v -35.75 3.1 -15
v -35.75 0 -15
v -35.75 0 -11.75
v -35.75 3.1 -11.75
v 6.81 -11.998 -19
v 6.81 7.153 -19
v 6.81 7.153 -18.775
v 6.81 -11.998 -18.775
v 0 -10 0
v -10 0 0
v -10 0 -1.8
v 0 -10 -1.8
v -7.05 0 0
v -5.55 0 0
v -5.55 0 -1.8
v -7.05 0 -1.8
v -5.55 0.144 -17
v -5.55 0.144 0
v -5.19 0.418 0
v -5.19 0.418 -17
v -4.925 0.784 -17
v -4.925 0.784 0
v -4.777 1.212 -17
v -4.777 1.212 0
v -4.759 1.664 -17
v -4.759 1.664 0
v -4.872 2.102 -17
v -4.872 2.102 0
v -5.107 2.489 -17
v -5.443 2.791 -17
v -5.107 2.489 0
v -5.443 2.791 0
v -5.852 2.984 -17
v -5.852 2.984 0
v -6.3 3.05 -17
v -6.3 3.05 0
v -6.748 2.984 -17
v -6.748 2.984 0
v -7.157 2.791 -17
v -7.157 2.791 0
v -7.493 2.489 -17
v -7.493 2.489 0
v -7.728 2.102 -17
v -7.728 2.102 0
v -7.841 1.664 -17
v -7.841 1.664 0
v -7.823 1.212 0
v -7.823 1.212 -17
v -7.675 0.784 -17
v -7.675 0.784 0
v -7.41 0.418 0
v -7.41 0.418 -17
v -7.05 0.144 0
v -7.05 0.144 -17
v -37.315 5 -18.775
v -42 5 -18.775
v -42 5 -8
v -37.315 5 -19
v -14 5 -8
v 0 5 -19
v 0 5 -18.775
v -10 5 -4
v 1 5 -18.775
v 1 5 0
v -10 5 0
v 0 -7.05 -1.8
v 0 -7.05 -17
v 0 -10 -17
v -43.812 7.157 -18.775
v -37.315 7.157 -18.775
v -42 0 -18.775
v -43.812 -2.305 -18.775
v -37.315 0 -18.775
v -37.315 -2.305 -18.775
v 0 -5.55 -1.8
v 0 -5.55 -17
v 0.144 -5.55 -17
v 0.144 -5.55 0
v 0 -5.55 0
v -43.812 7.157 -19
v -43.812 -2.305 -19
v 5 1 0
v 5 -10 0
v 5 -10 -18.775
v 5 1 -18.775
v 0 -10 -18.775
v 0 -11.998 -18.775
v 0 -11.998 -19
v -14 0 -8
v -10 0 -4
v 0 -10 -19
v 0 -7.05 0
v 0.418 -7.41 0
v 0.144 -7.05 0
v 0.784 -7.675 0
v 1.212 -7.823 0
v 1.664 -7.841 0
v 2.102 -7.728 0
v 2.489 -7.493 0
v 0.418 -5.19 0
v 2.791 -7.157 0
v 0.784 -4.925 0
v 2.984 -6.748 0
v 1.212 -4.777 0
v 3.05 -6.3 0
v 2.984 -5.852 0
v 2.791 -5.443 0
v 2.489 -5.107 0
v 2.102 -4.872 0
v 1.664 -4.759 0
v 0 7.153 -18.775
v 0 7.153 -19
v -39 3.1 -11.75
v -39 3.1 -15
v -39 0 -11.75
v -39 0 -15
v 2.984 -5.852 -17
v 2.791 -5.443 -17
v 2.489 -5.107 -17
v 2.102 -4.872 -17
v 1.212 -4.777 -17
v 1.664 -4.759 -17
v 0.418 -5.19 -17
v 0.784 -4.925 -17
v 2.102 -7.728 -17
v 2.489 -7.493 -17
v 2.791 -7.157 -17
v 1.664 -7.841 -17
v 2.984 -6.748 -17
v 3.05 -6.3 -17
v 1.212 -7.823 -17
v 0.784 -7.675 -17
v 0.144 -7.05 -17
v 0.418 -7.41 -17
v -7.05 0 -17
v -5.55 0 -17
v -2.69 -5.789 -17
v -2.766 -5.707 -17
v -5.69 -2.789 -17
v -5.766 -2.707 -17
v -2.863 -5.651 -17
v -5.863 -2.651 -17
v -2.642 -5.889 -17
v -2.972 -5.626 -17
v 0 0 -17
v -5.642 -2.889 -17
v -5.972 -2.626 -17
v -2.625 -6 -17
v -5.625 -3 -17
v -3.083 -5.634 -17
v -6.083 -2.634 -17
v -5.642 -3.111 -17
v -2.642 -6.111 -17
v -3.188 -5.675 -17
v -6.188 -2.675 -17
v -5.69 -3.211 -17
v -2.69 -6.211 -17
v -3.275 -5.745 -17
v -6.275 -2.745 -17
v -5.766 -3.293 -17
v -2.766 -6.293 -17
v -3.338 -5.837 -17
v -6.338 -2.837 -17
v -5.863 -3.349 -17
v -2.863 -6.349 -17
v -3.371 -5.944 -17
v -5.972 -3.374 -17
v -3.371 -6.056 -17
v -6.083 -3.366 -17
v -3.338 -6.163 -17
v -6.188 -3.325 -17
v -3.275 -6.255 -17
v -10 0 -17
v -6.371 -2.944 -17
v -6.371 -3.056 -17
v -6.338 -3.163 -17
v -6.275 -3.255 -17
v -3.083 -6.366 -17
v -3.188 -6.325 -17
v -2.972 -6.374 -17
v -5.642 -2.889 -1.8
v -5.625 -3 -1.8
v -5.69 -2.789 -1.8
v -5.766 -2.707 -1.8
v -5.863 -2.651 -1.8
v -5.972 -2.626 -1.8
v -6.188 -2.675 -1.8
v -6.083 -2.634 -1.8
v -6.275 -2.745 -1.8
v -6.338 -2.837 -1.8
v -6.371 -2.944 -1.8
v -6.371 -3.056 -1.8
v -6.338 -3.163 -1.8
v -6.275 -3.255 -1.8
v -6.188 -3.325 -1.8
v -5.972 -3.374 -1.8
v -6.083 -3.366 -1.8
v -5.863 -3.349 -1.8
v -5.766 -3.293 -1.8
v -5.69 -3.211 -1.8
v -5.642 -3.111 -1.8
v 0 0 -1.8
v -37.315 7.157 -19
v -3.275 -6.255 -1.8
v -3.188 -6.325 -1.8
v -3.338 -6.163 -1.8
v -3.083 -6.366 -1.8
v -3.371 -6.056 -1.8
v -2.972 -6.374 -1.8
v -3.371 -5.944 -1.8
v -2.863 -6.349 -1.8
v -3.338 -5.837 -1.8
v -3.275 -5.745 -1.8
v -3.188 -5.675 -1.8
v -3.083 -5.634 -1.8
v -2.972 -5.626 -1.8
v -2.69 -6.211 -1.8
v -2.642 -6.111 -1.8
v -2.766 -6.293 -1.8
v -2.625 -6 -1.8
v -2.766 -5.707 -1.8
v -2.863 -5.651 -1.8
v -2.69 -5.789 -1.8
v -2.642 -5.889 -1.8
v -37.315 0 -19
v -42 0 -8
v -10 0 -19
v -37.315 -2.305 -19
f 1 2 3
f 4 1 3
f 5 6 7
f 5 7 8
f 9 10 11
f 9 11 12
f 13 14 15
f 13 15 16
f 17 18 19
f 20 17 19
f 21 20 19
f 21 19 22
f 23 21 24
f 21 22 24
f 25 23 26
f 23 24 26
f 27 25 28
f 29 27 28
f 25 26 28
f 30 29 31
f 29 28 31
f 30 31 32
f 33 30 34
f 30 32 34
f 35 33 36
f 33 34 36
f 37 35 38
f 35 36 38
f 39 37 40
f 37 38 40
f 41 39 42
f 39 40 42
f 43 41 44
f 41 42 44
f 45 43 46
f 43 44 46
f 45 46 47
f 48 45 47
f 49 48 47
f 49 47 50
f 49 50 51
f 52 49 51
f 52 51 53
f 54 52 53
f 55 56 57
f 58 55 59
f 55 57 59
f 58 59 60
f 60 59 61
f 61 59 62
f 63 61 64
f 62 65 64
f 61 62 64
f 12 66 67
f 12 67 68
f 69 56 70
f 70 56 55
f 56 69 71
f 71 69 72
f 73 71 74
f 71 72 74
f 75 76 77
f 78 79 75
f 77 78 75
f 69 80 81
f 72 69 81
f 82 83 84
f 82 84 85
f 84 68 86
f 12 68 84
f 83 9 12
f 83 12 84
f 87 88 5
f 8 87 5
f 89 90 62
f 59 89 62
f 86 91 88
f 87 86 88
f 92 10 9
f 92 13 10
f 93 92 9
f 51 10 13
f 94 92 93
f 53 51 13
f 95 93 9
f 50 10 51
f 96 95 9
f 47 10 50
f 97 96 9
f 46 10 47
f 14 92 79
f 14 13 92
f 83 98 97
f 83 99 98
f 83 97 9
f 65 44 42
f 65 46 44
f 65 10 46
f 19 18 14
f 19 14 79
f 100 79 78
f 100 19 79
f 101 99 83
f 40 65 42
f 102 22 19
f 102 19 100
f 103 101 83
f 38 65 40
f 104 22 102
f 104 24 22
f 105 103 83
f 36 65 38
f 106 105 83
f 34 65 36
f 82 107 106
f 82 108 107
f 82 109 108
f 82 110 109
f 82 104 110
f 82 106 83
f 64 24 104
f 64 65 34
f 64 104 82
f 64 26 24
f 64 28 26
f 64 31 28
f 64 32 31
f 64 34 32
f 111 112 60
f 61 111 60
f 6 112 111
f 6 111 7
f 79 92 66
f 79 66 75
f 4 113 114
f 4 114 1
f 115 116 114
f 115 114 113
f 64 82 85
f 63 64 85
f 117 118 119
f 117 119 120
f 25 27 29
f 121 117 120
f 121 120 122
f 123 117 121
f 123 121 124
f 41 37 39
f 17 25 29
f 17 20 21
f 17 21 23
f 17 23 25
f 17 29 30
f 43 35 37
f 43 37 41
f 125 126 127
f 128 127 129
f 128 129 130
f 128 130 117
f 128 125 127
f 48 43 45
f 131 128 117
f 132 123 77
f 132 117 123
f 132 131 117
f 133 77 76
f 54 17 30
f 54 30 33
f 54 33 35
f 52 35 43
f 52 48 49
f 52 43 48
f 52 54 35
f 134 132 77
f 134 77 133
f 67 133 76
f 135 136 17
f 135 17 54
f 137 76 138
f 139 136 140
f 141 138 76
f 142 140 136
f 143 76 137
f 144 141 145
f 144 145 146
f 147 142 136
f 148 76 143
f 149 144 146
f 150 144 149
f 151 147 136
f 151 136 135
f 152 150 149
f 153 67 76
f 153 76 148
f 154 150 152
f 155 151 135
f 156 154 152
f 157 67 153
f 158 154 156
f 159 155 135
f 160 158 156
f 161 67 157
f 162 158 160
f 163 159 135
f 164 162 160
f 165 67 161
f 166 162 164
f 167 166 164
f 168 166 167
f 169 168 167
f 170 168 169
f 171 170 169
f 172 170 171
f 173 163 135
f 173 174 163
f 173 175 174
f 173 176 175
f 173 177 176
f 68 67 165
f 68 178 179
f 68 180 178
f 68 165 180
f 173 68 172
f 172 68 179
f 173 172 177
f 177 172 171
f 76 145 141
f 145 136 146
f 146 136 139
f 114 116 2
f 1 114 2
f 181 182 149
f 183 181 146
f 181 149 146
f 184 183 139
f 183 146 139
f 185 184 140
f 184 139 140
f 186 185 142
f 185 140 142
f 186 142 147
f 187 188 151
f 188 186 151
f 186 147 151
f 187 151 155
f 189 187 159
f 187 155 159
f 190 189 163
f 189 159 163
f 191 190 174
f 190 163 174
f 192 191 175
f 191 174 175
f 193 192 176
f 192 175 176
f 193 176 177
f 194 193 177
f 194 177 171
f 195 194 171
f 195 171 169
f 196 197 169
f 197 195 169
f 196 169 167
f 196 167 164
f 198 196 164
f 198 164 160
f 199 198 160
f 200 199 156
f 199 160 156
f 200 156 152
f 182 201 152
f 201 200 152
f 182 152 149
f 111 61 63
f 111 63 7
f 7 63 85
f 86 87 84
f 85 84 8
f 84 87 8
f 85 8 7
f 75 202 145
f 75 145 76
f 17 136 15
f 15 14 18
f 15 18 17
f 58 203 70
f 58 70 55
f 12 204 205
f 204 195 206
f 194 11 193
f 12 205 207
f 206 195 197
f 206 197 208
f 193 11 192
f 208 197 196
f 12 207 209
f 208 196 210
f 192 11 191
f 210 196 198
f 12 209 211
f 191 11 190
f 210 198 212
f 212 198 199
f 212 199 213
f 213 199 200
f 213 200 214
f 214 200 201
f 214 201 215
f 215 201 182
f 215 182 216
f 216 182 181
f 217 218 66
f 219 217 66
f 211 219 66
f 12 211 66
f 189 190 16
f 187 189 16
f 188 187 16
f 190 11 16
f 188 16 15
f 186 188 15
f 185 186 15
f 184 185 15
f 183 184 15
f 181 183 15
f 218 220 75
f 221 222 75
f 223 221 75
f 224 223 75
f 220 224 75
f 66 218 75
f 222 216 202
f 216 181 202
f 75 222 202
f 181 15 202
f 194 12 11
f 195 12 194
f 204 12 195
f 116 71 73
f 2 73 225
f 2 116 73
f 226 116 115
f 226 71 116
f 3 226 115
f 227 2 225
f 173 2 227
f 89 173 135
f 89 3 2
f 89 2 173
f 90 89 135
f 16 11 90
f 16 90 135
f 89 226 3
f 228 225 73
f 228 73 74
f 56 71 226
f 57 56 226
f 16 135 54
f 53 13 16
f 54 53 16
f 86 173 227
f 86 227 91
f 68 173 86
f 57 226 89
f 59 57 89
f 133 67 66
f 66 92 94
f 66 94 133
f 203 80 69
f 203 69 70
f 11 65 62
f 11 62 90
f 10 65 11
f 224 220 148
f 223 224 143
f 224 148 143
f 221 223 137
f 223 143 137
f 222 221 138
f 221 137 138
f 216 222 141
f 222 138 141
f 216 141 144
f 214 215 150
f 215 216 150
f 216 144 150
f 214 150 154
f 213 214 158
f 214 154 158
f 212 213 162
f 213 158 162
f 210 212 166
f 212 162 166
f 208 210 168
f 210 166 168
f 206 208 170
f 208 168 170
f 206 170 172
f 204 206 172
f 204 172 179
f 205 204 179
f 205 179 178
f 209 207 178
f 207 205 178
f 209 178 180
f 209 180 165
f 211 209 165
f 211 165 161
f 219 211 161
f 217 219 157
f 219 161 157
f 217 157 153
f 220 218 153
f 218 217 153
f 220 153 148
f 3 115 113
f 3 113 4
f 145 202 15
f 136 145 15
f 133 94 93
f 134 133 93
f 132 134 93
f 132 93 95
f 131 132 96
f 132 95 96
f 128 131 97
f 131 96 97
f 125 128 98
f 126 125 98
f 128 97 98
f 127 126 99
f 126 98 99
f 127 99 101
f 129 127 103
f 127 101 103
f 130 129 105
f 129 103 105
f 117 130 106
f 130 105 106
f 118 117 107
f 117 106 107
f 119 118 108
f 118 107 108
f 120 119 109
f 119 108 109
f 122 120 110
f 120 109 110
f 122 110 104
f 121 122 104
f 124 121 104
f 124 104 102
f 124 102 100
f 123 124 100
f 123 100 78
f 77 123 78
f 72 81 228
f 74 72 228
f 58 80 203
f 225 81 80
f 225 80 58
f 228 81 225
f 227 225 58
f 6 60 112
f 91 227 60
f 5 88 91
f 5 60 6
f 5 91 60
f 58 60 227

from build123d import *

# Parameters (mm, degrees)
PAD_DEPTH     = 17
PAD001_DEPTH  = 2
PAD002_DEPTH  = 1.8
SKETCH003_W   = 32
SKETCH003_H   = 11
PAD003_DEPTH  = 5
SKETCH004_W   = 3.25
SKETCH004_H   = 3.25
POCKET_DEPTH  = 3.1
SKETCH005_W   = 6.497684
SKETCH005_H   = 9.461539
SKETCH005_W_2 = 6.809606
SKETCH005_H_2 = 19.151065
PAD004_DEPTH  = 0.225
CHAMFER_SIZE  = 4
SKETCH006_R   = 0.375
PAD005_DEPTH  = 16


with BuildPart() as part:
    # Sketch → Pad (new body)
    with BuildSketch(Plane.XY):
        with BuildLine():
            Line((-10, 0), (-10, 5))
            Line((-10, 5), (5, 5))
            Line((5, 5), (5, -10))
            Line((5, -10), (0, -10))
            Line((0, -7.05), (0, -10))
            Line((0, -7.05), (0.143534, -7.05))
            ThreePointArc((0.143534, -7.05), (3.05, -6.3), (0.143534, -5.55))
            Line((0, -5.55), (0.143534, -5.55))
            Line((0, 0), (0, -5.55))
            Line((0, 0), (-5.55, 0))
            Line((-5.55, 0), (-5.55, 0.143534))
            ThreePointArc((-5.55, 0.143534), (-6.3, 3.05), (-7.05, 0.143534))
            Line((-7.05, 0), (-7.05, 0.143534))
            Line((-10, 0), (-7.05, 0))
        make_face()
    extrude(amount=-PAD_DEPTH)

    # Sketch001 (on Face16 of Pad) → Pad001 (join)
    with BuildSketch(Plane(origin=(0, 0, -17), x_dir=(1, 0, 0), z_dir=(0, 0, -1))):
        Polygon((5, -5), (-10, -5), (-10, 0), (0, 10), (5, 10), align=None)
    extrude(amount=PAD001_DEPTH)

    # Sketch002 (on Face1 of Pad001) → Pad002 (join)
    with BuildSketch(Plane.XY):
        Polygon((0, -10), (0, 0), (-10, 0), align=None)
    extrude(amount=-PAD002_DEPTH)

    # Sketch003 (on Face10 of Pad002) → Pad003 (join)
    with BuildSketch(Plane.XZ):
        with Locations((-26, -13.5)):
            Rectangle(SKETCH003_W, SKETCH003_H)
    extrude(amount=-PAD003_DEPTH)

    # Sketch004 (on Face22 of Pad003) → Pocket (cut)
    with BuildSketch(Plane.XZ):
        with Locations((-37.375, -13.375)):
            Rectangle(SKETCH004_W, SKETCH004_H)
    extrude(amount=-POCKET_DEPTH, mode=Mode.SUBTRACT)

    # Sketch005 → Pad004 (join)
    with BuildSketch(Plane(origin=(0, 0, -19), x_dir=(1, 0, 0), z_dir=(0, 0, -1))):
        with Locations((-40.563391, -2.425933)):
            Rectangle(SKETCH005_W, SKETCH005_H)
        with Locations((3.404803, 2.422745)):
            Rectangle(SKETCH005_W_2, SKETCH005_H_2)
    extrude(amount=-PAD004_DEPTH)

    # Chamfer
    chamfer_edges = [part.edges().sort_by_distance(p)[0] for p in [
        (-10, 2.5, -8),
        (5, 5, -9.3875),
    ]]
    chamfer(chamfer_edges, length=CHAMFER_SIZE)

    # Sketch006 (on Face29 of Chamfer) → Pad005 (join)
    with BuildSketch(Plane.XY.offset(-17)):
        with Locations((-6, -3)):
            Circle(SKETCH006_R)
        with Locations((-3, -6)):
            Circle(SKETCH006_R)
    extrude(amount=PAD005_DEPTH)


solid = part.part
